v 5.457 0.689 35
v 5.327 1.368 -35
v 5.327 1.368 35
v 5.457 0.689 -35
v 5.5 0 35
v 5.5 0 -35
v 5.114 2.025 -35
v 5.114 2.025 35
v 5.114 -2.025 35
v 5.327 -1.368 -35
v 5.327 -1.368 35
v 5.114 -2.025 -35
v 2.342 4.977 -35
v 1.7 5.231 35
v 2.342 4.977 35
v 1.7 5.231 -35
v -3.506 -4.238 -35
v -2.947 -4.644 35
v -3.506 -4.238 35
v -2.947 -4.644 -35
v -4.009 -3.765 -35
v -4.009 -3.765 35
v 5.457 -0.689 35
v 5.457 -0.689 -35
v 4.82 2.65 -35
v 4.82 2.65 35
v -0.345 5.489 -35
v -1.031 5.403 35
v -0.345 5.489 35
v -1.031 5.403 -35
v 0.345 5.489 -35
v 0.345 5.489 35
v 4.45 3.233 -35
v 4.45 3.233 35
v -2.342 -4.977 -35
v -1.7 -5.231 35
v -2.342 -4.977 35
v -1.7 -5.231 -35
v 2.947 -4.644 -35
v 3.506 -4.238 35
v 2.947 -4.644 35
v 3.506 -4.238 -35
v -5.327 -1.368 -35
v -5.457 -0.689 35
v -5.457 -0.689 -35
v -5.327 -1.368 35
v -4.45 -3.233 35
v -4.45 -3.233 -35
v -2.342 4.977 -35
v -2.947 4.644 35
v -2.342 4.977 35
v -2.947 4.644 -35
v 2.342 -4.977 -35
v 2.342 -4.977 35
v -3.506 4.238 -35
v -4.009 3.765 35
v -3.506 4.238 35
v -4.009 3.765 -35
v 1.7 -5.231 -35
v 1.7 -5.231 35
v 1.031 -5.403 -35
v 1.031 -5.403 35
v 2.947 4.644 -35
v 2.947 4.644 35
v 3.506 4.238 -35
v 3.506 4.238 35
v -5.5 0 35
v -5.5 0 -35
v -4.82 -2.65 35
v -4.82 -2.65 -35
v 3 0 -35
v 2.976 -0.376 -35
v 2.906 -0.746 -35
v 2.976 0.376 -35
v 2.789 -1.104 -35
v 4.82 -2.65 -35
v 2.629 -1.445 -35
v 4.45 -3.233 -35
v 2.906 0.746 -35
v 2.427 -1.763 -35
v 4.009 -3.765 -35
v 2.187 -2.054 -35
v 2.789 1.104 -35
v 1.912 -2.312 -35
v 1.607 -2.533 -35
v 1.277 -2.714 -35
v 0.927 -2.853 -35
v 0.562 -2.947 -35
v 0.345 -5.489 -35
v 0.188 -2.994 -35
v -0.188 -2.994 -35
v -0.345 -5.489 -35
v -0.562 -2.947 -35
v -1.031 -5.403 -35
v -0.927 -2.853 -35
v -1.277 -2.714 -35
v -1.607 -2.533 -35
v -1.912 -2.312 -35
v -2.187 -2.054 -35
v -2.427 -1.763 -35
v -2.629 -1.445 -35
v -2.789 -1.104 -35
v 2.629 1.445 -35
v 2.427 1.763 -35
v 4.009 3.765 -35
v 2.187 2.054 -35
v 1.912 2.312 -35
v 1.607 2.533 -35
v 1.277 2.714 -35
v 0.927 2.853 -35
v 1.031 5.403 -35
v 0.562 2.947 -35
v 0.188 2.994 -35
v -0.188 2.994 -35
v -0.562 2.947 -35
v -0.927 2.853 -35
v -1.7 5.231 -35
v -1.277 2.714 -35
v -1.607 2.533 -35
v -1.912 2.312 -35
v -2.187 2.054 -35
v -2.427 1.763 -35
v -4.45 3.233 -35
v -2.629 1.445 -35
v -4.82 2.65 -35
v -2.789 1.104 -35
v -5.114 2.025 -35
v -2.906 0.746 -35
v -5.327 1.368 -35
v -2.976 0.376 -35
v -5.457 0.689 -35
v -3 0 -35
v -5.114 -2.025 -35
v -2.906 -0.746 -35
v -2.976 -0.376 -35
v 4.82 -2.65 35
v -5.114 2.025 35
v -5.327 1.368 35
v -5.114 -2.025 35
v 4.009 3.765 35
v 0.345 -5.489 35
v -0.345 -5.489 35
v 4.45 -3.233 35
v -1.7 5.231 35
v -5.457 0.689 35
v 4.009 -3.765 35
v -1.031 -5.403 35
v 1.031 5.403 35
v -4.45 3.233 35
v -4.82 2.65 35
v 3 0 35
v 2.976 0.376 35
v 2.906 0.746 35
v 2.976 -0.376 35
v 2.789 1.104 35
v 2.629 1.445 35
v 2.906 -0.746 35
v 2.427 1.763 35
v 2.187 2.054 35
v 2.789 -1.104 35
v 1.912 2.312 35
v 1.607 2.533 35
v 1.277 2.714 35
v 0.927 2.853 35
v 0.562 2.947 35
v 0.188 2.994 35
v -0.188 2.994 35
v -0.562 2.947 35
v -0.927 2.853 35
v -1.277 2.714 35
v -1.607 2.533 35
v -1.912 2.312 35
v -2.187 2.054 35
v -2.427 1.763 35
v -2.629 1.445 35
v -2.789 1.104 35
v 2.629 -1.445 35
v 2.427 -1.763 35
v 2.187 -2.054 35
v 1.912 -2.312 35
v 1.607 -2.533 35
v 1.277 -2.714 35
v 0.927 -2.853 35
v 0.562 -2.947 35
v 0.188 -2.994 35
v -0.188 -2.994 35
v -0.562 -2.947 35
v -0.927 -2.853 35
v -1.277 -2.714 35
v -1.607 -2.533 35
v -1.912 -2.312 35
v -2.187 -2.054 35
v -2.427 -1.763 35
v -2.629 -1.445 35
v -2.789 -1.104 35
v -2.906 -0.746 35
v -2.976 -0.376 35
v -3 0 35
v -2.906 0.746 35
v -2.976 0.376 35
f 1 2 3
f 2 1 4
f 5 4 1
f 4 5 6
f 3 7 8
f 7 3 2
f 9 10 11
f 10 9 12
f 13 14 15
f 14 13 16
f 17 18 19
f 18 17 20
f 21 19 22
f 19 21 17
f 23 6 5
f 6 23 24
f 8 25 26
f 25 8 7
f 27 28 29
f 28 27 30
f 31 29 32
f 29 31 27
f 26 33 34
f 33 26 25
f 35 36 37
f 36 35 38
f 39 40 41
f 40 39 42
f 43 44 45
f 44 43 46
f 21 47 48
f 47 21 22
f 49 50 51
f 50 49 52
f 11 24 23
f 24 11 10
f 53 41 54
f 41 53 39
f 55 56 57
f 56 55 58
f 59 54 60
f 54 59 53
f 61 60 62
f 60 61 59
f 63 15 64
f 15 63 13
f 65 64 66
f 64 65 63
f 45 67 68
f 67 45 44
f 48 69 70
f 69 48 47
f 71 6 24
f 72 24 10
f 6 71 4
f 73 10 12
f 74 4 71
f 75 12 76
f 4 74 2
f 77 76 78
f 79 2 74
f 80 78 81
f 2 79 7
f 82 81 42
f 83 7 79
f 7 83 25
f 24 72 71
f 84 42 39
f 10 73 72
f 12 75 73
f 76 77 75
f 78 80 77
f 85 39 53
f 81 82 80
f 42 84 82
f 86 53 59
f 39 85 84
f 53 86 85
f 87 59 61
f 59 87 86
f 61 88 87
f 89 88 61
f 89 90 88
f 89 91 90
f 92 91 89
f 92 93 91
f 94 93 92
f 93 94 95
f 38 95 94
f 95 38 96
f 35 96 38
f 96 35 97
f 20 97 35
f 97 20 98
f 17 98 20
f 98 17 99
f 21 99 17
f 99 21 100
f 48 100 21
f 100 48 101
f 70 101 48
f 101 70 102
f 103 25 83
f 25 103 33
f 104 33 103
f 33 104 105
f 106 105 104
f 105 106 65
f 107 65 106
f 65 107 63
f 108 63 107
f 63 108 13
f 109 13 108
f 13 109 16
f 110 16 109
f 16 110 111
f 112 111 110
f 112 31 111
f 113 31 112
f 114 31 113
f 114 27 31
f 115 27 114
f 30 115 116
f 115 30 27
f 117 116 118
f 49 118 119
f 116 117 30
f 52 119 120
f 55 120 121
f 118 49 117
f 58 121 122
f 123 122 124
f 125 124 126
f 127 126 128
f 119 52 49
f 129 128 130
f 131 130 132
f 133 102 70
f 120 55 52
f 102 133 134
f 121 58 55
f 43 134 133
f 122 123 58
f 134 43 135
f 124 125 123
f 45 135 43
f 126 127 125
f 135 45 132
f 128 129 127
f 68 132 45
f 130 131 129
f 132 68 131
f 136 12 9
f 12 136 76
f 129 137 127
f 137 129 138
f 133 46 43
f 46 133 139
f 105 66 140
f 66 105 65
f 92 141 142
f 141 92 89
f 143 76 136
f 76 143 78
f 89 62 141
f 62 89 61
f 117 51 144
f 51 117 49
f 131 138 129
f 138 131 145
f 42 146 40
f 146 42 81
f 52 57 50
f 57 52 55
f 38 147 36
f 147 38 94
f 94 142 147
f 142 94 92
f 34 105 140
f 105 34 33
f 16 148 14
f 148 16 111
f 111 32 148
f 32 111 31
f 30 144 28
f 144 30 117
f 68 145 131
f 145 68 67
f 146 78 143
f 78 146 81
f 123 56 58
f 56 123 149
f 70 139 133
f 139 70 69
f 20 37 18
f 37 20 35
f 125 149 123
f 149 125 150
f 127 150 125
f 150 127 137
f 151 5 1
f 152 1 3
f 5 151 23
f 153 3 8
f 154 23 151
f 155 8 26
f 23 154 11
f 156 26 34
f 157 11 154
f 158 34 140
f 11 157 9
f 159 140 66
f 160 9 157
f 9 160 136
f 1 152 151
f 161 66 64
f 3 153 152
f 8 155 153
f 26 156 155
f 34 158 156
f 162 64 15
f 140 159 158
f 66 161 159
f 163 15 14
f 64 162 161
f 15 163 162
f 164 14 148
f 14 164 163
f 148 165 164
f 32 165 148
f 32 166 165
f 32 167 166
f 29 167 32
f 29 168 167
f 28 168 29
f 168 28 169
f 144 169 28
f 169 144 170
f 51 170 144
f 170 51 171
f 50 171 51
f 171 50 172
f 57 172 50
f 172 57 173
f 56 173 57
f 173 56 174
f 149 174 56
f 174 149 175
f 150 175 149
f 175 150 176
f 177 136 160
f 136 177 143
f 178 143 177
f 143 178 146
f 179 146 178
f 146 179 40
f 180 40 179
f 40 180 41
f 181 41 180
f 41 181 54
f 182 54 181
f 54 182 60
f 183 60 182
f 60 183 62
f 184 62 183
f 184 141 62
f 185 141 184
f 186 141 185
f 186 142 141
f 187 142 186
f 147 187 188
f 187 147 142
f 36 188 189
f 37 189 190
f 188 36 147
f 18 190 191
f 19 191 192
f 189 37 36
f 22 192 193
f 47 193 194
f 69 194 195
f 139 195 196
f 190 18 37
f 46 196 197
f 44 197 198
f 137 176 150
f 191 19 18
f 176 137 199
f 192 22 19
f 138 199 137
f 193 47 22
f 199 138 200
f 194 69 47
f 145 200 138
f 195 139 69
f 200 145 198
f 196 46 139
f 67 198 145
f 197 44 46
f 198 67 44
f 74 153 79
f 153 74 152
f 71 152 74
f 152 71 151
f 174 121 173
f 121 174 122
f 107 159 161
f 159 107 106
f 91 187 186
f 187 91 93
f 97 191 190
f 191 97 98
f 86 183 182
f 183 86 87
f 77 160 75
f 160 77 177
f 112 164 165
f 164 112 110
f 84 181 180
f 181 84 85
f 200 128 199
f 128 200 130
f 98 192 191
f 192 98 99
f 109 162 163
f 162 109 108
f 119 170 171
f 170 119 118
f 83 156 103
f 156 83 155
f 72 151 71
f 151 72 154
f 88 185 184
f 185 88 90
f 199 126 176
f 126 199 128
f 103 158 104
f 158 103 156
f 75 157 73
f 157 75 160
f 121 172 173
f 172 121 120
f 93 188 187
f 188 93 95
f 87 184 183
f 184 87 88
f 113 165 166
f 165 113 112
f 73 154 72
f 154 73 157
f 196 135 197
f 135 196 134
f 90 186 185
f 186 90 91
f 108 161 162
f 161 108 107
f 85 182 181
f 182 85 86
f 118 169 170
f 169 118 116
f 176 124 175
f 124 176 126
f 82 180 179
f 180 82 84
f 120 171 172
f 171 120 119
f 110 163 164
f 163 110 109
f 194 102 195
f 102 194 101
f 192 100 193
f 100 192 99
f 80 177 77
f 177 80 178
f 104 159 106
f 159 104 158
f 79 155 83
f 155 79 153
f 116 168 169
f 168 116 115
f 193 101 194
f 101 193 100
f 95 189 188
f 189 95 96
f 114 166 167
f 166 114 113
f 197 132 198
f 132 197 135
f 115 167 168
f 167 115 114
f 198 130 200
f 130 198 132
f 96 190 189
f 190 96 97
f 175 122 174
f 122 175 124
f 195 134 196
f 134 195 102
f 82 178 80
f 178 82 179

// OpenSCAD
$fn = 50;


difference() {
	union() {
		translate(v = [0, 0, -35.0000000000]) {
			cylinder(h = 70, r = 5.5000000000);
		}
	}
	union() {
		translate(v = [0, 0, -100.0000000000]) {
			cylinder(h = 200, r = 3.0000000000);
		}
	}
}
